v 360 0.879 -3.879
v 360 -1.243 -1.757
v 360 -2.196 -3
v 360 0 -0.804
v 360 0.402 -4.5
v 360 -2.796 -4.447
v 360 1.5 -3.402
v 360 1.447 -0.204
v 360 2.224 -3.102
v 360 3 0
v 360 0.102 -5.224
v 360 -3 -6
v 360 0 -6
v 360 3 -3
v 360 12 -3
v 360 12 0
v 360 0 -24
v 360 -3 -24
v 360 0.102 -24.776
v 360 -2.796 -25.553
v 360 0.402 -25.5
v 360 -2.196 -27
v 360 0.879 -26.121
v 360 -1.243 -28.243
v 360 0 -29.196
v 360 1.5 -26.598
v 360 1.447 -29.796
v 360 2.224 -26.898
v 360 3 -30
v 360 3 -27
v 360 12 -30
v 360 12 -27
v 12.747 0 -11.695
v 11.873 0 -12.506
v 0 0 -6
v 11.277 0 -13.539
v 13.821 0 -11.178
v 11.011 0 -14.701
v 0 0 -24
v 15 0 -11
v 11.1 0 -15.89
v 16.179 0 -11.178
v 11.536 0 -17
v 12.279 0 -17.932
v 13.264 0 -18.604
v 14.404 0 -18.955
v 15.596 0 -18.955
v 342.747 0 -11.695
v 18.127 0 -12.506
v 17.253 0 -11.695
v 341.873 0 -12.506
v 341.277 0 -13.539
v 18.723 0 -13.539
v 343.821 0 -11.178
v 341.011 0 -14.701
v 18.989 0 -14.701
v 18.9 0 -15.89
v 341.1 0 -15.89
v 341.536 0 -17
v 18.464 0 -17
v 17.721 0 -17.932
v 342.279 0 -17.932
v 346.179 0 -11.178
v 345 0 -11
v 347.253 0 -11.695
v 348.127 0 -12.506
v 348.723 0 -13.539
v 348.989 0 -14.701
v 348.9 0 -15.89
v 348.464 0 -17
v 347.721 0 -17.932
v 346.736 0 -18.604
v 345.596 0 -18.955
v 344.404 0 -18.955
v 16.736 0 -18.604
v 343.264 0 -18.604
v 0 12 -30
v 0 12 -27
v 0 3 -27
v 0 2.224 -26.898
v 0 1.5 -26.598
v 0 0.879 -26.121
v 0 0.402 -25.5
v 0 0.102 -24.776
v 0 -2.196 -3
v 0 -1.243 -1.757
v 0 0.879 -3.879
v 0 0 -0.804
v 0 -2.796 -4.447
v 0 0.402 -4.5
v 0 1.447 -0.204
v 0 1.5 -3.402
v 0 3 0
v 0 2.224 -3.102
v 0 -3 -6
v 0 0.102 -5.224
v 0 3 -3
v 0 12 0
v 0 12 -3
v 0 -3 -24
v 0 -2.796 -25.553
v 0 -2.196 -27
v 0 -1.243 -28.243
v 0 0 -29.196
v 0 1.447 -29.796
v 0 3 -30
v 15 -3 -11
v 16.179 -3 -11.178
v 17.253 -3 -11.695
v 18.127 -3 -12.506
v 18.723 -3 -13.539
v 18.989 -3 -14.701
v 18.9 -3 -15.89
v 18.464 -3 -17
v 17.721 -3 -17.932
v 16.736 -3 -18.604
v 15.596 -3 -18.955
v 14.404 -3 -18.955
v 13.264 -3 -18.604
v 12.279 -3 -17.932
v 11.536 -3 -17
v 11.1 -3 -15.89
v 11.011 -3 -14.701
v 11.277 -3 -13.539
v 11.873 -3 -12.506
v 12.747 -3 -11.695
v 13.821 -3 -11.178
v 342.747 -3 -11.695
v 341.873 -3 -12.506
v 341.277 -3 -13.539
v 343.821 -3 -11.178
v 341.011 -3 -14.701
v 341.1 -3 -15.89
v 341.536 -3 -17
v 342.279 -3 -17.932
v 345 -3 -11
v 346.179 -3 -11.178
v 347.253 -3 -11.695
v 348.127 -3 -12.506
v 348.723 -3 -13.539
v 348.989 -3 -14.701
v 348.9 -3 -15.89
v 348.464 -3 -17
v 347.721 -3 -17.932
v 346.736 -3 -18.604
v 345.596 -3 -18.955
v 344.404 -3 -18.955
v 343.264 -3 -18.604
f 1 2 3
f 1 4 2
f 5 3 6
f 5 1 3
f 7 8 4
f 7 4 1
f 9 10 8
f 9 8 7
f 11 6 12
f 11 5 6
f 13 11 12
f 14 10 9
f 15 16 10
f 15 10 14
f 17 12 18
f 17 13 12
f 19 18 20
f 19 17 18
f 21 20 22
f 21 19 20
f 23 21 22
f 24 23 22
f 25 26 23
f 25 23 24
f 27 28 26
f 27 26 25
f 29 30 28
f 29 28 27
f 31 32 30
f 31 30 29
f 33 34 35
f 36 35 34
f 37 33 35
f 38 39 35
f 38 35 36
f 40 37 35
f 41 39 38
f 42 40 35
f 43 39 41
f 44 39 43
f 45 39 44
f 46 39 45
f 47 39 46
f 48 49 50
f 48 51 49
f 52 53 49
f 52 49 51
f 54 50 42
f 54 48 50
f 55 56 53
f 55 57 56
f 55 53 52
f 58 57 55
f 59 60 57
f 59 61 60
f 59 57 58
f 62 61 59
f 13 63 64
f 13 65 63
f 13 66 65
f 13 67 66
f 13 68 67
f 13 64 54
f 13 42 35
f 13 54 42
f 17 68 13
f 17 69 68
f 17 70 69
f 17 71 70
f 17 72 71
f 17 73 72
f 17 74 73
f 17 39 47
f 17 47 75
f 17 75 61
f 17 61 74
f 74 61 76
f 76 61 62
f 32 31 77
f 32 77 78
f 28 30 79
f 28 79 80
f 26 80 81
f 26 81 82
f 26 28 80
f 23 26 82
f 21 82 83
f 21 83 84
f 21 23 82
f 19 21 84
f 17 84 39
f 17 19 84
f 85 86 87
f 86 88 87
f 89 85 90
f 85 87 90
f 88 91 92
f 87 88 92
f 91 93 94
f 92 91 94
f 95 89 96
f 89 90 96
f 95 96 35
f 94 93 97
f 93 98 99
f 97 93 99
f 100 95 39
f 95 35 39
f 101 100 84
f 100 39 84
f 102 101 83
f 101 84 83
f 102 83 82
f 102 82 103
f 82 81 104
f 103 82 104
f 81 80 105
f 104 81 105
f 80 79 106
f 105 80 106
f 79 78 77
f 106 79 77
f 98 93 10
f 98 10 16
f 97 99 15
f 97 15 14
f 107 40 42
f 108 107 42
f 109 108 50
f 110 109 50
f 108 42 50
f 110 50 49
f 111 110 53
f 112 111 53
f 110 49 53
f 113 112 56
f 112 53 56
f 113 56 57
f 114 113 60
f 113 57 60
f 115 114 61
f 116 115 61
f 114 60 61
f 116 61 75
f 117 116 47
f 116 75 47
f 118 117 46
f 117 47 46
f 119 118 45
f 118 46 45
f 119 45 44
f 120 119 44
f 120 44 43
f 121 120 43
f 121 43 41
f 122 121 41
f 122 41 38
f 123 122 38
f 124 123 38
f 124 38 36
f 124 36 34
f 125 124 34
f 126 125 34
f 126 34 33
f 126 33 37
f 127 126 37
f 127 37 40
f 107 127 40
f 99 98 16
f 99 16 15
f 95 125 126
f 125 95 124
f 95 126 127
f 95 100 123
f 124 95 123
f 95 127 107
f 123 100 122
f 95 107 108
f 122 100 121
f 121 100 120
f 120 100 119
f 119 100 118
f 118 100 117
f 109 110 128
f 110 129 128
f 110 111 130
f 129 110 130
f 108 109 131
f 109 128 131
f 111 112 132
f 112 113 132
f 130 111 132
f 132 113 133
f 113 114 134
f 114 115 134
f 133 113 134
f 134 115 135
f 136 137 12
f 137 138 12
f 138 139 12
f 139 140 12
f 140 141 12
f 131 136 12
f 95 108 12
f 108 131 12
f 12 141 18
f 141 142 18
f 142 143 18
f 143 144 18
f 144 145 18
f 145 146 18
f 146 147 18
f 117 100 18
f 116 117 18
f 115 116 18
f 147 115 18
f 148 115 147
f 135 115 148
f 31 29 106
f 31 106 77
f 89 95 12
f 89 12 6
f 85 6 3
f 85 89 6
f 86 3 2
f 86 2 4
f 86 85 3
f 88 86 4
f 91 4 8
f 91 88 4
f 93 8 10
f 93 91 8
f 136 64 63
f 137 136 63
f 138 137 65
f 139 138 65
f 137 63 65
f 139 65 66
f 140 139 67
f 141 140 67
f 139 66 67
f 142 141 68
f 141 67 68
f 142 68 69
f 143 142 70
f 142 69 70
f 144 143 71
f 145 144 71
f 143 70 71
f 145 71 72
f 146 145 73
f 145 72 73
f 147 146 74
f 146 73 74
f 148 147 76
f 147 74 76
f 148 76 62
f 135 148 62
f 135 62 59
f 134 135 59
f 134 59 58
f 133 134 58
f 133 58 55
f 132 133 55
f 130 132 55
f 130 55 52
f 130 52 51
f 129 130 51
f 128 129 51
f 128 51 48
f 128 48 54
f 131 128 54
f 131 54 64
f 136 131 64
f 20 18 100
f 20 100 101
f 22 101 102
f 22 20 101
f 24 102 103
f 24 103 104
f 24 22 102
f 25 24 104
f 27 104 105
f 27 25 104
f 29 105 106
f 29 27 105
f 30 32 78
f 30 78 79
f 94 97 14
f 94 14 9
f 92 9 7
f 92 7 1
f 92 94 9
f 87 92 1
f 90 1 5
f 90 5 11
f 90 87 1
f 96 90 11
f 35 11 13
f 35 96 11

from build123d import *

# Parameters (mm, degrees)
ESQUISSE2_W                             = 360
ESQUISSE2_H                             = 30
T_LE_DE_BASE_PLI_E1_DEPTH               = 3
T_LE_PLI_E_SUR_AR_TE1_STRIP_W           = 18
T_LE_PLI_E_SUR_AR_TE1_STRIP_H           = 3
T_LE_PLI_E_SUR_AR_TE1_STRIP_CUT_DEPTH   = 360
T_LE_PLI_E_SUR_AR_TE1_STRIP_2_W         = 18
T_LE_PLI_E_SUR_AR_TE1_STRIP_2_H         = 3
T_LE_PLI_E_SUR_AR_TE1_STRIP_CUT_2_DEPTH = 360
T_LE_PLI_E_SUR_AR_TE1_DEPTH             = 360
T_LE_PLI_E_SUR_AR_TE1_BEND_DEPTH        = 360
ENL_V_MAT_EXTRU_1_REACH                 = 363.447
ESQUISSE10_R                            = 4


# Sheet-metal steps are written as plain solids
with BuildPart() as part:
    # Esquisse2 → Tôle de base pliée1 (new body)
    with BuildSketch(Plane(origin=(0, 0, 0), x_dir=(1, 0, 0), z_dir=(0, 1, 0))):
        with Locations((180, 15)):
            Rectangle(ESQUISSE2_W, ESQUISSE2_H)
    extrude(amount=-T_LE_DE_BASE_PLI_E1_DEPTH)

    # Tôle pliée sur arête1 strip (across the edge) → Tôle pliée sur arête1 strip cut (cut)
    with BuildSketch(Plane(origin=(0, 0, 0), x_dir=(0, 0, -1), z_dir=(1, 0, 0))):
        with Locations((-3, -1.5)):
            Rectangle(T_LE_PLI_E_SUR_AR_TE1_STRIP_W, T_LE_PLI_E_SUR_AR_TE1_STRIP_H)
    extrude(amount=T_LE_PLI_E_SUR_AR_TE1_STRIP_CUT_DEPTH, mode=Mode.SUBTRACT)

    # Tôle pliée sur arête1 strip 2 (across the edge) → Tôle pliée sur arête1 strip cut 2 (cut)
    with BuildSketch(Plane(origin=(360, 0, -30), x_dir=(0, 0, 1), z_dir=(-1, 0, 0))):
        with Locations((-3, -1.5)):
            Rectangle(T_LE_PLI_E_SUR_AR_TE1_STRIP_2_W, T_LE_PLI_E_SUR_AR_TE1_STRIP_2_H)
    extrude(amount=T_LE_PLI_E_SUR_AR_TE1_STRIP_CUT_2_DEPTH, mode=Mode.SUBTRACT)

    # Tôle pliée sur arête1 section (across the edge) → Tôle pliée sur arête1 (add)
    with BuildSketch(Plane(origin=(0, 0, 0), x_dir=(0, 0, -1), z_dir=(1, 0, 0))):
        with BuildLine():
            Line((0, 3), (0, 12))
            Line((0, 12), (3, 12))
            Line((3, 12), (3, 3))
            ThreePointArc((3, 3), (3.878679656, 0.878679656), (6, 0))
            Line((6, 0), (6, -3))
            ThreePointArc((6, -3), (1.757359313, -1.242640687), (0, 3))
        make_face()
    extrude(amount=T_LE_PLI_E_SUR_AR_TE1_DEPTH)

    # Tôle pliée sur arête1 section 2 (across the edge) → Tôle pliée sur arête1 bend (add)
    with BuildSketch(Plane(origin=(360, 0, -30), x_dir=(0, 0, 1), z_dir=(-1, 0, 0))):
        with BuildLine():
            Line((0, 3), (0, 12))
            Line((0, 12), (3, 12))
            Line((3, 12), (3, 3))
            ThreePointArc((3, 3), (3.878679656, 0.878679656), (6, 0))
            Line((6, 0), (6, -3))
            ThreePointArc((6, -3), (1.757359313, -1.242640687), (0, 3))
        make_face()
    extrude(amount=T_LE_PLI_E_SUR_AR_TE1_BEND_DEPTH)

    # Esquisse10 → Enlèv. mat.-Extru.1 (cut, up to next)
    with BuildSketch(Plane(origin=(0, 0, 0), x_dir=(1, 0, 0), z_dir=(0, 1, 0)), mode=Mode.PRIVATE) as enl_v_mat_extru_1_sk1:
        with Locations(Location((15, 15, 0), (0, 0, 270))):
            Circle(ESQUISSE10_R)
    enl_v_mat_extru_1_tool1 = extrude(enl_v_mat_extru_1_sk1.sketch, amount=-ENL_V_MAT_EXTRU_1_REACH, mode=Mode.PRIVATE) & part.part
    # Esquisse10 → Enlèv. mat.-Extru.1 (cut, up to next)
    with BuildSketch(Plane(origin=(0, 0, 0), x_dir=(1, 0, 0), z_dir=(0, 1, 0)), mode=Mode.PRIVATE) as enl_v_mat_extru_1_sk2:
        with Locations(Location((345, 15, 0), (0, 0, 270))):
            Circle(ESQUISSE10_R)
    enl_v_mat_extru_1_tool2 = extrude(enl_v_mat_extru_1_sk2.sketch, amount=-ENL_V_MAT_EXTRU_1_REACH, mode=Mode.PRIVATE) & part.part
    add(enl_v_mat_extru_1_tool1.solids().sort_by_distance((15, 0, -15))[0], mode=Mode.SUBTRACT)
    add(enl_v_mat_extru_1_tool2.solids().sort_by_distance((345, 0, -15))[0], mode=Mode.SUBTRACT)


solid = part.part
